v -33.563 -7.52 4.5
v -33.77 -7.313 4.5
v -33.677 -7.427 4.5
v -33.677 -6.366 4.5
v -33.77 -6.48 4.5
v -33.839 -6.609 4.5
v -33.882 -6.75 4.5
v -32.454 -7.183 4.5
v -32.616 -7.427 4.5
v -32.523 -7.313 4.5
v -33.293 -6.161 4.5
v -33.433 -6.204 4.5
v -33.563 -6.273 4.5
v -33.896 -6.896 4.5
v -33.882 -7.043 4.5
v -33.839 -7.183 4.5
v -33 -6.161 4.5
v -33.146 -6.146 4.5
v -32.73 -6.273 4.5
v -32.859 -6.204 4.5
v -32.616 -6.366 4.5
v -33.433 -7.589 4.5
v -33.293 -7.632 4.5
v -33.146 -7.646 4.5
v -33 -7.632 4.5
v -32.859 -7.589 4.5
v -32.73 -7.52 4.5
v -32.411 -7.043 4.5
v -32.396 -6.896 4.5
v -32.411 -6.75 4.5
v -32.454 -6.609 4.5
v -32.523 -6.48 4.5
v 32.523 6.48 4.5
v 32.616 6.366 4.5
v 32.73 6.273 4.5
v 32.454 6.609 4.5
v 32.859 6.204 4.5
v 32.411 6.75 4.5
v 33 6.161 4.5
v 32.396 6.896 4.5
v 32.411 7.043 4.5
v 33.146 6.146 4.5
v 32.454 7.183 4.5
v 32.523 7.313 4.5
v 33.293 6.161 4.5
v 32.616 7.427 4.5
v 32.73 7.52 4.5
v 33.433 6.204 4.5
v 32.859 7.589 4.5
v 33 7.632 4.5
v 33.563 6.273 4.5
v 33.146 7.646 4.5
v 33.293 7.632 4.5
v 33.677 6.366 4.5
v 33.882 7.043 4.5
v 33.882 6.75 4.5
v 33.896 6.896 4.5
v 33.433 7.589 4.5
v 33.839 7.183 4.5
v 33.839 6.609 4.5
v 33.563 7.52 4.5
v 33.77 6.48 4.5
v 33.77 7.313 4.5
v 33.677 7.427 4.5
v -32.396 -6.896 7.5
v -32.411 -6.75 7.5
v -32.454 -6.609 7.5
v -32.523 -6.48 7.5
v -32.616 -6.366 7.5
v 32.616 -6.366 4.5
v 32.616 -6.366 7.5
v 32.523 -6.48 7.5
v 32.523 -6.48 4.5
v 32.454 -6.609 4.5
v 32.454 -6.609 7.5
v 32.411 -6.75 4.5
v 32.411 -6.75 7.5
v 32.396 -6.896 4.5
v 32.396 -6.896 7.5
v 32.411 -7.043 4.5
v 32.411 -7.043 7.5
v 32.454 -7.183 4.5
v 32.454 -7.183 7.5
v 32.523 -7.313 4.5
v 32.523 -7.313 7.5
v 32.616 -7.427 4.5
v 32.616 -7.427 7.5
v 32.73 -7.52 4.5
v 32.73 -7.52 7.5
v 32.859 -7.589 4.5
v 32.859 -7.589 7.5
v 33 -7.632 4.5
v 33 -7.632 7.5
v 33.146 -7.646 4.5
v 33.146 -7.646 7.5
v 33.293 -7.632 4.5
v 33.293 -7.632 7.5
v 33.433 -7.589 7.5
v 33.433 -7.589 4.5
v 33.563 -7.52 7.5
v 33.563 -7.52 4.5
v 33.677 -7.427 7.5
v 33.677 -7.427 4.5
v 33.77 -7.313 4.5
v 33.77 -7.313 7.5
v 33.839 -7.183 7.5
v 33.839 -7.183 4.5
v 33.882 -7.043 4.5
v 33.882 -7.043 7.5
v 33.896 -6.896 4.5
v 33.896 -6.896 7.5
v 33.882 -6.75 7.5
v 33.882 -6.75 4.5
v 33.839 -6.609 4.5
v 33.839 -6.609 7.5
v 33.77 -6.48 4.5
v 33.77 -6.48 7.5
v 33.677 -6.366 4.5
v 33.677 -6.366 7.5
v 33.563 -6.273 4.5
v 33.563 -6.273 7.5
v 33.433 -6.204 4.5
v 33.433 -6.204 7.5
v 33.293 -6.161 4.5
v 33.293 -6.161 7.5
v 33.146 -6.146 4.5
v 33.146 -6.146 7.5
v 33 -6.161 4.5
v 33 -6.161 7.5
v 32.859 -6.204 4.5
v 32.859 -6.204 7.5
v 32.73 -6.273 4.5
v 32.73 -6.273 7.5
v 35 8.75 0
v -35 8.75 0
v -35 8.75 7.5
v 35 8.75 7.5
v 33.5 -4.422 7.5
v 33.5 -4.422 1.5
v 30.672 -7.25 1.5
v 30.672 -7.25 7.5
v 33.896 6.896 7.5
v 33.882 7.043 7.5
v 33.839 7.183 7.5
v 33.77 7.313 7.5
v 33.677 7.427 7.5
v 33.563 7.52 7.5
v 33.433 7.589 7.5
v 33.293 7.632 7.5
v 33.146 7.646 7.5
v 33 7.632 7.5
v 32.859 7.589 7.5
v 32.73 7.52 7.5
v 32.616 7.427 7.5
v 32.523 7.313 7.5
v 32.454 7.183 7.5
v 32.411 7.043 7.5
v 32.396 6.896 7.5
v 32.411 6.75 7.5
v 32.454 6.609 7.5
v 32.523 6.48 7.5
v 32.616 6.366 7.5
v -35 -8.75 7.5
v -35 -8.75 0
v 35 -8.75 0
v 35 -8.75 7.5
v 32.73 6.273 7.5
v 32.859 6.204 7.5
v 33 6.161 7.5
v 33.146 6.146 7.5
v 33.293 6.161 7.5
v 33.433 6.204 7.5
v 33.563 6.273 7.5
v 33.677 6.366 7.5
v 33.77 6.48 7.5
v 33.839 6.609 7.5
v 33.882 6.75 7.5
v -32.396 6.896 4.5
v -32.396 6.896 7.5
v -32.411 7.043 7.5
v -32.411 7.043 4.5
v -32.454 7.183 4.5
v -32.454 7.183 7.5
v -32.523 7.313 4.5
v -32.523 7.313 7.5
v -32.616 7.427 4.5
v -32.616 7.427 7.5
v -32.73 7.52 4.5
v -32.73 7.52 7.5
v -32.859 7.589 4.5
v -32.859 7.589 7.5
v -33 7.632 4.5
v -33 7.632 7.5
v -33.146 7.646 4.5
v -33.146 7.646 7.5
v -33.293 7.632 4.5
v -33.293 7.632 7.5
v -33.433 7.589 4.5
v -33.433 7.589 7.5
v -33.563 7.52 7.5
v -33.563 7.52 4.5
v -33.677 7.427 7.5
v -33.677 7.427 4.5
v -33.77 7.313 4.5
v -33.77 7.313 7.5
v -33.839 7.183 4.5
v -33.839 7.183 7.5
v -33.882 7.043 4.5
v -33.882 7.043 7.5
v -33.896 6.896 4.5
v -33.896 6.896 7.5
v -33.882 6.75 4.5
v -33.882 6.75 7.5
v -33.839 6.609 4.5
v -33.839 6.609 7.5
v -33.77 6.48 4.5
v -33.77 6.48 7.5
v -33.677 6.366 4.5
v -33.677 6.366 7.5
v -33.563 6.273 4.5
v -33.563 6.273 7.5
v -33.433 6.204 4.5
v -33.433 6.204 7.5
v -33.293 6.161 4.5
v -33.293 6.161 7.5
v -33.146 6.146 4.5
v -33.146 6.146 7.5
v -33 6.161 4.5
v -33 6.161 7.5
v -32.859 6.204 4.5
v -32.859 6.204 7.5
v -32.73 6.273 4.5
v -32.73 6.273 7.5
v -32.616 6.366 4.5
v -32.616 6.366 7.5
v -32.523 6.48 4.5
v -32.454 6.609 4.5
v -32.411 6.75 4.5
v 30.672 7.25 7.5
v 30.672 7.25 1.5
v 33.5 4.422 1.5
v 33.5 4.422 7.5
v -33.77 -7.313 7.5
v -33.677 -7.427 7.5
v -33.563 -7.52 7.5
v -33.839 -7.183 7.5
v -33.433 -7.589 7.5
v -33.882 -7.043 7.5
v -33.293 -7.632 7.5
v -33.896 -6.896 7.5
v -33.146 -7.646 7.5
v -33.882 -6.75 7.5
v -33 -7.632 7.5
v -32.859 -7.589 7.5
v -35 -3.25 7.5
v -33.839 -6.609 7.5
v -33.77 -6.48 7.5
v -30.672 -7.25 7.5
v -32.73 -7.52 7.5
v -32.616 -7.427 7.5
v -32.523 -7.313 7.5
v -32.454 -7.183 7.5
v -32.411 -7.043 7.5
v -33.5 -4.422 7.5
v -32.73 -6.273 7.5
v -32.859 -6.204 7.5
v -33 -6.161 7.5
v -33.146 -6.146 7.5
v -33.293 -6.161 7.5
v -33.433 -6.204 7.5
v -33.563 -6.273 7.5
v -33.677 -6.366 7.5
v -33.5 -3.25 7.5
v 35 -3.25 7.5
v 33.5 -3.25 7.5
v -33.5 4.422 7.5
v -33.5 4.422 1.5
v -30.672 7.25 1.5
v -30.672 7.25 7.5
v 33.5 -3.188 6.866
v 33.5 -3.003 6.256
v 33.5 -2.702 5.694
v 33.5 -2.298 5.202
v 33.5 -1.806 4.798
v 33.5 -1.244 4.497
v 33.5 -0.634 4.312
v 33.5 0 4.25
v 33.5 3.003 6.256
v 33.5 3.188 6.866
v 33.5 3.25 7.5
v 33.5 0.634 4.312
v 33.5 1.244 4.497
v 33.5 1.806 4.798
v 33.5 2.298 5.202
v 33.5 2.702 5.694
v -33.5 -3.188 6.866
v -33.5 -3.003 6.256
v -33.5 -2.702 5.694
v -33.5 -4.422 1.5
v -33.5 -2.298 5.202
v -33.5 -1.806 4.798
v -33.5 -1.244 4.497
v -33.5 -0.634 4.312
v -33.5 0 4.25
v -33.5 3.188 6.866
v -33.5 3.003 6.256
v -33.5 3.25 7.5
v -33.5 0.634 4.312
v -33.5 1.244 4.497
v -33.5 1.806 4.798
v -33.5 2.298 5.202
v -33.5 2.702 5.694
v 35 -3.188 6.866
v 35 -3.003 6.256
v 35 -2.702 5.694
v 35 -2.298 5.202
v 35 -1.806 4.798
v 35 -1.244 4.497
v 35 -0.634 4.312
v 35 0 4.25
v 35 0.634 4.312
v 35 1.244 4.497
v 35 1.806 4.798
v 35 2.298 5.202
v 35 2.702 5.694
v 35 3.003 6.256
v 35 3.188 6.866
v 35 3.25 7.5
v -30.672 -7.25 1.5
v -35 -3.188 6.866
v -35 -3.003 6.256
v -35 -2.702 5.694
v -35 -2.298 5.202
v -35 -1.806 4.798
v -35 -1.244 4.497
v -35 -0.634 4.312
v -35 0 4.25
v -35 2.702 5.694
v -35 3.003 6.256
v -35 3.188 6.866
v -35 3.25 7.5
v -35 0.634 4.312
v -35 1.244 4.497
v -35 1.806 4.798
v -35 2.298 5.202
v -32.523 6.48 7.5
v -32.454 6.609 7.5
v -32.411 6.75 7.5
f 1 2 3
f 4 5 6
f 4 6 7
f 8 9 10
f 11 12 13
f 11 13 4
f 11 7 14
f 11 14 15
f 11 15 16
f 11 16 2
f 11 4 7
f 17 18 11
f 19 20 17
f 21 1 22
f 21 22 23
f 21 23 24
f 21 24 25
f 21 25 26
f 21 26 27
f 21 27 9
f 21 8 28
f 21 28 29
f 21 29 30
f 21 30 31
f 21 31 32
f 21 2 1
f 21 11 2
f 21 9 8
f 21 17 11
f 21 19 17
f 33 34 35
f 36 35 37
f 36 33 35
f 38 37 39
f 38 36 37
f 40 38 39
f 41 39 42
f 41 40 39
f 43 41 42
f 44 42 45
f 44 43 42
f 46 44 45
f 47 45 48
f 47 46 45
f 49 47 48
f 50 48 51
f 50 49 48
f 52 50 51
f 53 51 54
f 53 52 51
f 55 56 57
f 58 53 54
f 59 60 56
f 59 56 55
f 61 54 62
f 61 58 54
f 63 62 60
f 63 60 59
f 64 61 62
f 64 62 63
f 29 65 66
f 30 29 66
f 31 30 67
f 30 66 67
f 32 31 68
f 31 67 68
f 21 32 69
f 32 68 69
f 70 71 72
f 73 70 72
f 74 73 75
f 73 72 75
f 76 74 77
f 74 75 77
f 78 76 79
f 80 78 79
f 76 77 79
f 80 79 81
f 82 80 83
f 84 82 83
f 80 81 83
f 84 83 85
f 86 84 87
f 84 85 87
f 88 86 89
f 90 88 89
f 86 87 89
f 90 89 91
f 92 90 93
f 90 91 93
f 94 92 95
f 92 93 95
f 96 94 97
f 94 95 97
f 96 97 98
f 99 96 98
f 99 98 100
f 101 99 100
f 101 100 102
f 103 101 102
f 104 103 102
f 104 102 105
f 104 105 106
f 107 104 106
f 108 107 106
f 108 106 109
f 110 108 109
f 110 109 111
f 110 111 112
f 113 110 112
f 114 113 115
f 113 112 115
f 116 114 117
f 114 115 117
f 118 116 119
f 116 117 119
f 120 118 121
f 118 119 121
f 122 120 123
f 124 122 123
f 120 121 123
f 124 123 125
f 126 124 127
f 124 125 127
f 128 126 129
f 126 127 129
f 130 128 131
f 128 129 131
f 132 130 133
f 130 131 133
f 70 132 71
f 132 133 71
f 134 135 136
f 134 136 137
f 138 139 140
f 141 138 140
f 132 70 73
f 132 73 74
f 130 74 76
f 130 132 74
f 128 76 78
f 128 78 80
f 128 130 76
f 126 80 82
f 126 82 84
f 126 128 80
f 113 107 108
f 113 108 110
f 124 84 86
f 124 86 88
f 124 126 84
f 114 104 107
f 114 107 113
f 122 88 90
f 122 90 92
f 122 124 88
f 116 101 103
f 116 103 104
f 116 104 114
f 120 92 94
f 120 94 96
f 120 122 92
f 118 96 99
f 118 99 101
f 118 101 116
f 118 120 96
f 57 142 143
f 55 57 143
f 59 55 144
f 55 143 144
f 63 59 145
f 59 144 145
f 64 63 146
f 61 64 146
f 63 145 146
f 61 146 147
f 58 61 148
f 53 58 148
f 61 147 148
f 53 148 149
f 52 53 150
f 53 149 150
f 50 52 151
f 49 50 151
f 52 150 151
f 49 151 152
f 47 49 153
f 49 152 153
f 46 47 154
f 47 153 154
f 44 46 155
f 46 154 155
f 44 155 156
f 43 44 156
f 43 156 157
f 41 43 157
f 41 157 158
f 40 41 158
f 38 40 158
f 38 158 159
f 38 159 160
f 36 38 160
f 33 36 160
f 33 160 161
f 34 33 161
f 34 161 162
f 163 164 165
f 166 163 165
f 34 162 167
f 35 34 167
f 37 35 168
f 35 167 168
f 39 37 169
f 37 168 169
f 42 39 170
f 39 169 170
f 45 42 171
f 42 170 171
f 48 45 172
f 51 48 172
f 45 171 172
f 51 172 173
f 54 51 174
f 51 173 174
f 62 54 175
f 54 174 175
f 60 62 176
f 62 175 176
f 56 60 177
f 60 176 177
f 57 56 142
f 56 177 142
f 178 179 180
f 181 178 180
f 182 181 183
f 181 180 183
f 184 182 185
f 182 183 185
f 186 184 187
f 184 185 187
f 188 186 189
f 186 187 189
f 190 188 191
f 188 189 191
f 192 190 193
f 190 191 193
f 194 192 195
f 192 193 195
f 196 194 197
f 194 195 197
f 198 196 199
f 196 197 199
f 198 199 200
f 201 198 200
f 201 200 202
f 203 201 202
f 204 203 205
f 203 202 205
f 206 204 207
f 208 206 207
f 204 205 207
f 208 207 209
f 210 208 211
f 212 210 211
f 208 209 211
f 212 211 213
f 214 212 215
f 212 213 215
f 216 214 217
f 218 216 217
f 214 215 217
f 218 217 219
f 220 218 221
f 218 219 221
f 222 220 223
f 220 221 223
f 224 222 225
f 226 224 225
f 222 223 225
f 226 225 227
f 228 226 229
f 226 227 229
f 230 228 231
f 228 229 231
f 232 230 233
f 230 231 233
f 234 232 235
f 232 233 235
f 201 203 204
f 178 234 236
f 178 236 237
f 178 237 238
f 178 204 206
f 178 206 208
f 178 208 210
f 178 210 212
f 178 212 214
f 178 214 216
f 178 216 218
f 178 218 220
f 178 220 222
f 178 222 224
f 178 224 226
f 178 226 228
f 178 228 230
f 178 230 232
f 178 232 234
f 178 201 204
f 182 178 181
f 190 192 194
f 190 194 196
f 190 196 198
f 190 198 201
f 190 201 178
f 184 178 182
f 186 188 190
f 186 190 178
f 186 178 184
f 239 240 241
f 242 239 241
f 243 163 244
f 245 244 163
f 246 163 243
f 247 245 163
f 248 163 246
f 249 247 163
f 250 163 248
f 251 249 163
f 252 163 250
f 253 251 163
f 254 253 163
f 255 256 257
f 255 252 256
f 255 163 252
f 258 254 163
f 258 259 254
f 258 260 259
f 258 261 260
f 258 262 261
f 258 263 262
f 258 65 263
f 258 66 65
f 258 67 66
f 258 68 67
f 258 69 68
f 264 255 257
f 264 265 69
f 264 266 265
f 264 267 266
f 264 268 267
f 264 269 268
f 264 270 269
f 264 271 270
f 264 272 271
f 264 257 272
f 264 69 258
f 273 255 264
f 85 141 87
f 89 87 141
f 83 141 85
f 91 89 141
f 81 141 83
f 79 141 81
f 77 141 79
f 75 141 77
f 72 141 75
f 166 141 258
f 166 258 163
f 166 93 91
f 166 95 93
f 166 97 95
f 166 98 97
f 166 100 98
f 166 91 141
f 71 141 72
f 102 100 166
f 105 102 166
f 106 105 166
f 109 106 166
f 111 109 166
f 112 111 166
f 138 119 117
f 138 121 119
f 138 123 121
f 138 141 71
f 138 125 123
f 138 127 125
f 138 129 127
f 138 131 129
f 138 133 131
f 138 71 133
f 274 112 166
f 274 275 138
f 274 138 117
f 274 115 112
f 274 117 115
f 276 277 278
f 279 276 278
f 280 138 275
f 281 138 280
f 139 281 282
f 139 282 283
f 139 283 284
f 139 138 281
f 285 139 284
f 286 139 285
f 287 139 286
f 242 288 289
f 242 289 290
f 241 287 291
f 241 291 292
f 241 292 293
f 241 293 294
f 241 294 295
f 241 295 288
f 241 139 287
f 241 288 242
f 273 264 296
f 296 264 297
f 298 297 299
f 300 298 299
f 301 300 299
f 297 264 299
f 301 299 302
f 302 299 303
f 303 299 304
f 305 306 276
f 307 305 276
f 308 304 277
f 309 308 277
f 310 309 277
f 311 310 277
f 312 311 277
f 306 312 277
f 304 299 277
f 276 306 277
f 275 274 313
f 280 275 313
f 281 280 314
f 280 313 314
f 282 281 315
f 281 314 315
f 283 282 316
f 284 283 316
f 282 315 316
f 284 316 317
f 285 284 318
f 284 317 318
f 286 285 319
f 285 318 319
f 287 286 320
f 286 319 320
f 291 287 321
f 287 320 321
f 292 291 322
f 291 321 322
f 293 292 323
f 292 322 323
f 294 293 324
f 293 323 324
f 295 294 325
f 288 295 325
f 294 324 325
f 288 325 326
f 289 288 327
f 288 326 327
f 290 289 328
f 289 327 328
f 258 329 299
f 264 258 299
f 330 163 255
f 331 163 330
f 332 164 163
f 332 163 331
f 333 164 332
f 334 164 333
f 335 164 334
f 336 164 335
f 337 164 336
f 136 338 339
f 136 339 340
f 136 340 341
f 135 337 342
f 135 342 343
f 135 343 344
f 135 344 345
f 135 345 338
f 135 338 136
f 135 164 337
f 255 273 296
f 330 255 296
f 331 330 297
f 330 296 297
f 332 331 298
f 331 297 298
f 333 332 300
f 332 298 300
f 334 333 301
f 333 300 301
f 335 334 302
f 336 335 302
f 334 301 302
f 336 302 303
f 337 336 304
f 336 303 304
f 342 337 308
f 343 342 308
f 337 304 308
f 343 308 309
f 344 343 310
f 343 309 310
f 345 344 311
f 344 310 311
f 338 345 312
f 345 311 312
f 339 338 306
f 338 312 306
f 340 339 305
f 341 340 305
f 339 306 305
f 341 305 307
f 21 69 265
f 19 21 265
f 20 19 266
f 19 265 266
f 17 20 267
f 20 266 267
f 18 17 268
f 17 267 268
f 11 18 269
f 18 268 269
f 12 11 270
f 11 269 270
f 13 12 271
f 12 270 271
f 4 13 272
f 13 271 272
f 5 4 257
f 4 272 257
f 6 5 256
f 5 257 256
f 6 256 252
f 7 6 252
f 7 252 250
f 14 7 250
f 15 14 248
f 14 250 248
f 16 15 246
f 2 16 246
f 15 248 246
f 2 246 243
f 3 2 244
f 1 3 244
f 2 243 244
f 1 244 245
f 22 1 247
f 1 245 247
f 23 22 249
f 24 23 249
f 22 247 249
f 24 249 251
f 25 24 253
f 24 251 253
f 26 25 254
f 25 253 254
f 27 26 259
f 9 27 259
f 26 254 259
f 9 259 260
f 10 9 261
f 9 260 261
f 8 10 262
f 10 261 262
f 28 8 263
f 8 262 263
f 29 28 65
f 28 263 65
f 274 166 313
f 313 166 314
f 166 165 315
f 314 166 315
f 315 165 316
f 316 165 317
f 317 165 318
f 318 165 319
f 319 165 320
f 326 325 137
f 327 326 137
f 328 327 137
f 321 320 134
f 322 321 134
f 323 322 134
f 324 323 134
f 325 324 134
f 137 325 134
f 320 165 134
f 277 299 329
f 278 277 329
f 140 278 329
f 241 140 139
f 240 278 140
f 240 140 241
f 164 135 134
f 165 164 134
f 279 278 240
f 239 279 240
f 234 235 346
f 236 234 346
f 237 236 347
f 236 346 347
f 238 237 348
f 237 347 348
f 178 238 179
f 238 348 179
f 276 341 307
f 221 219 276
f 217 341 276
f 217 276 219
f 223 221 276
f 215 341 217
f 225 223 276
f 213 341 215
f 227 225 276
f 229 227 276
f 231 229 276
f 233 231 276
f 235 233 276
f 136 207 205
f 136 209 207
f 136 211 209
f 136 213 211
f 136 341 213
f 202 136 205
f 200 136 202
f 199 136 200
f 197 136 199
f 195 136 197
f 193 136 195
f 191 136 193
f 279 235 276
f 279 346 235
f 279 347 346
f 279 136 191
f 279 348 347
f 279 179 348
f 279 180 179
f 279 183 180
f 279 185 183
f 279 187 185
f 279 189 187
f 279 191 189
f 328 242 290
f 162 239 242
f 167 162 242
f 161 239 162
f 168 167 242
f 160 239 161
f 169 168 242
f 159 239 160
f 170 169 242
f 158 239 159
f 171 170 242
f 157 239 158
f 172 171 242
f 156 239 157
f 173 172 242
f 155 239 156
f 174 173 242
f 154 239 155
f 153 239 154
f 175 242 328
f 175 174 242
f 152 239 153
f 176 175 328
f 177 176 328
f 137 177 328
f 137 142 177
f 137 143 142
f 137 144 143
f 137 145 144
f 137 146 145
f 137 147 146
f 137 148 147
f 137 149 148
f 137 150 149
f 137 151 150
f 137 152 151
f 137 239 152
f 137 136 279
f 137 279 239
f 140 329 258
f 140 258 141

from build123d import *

# Parameters (mm, degrees)
F0_W     = 70
F0_H     = 17.5
F1_DEPTH = 7.5
F2_T     = -1.5
F4_DEPTH = 6
F6_DEPTH = 3
F7_R     = 3.25
F8_DEPTH = 70.001


with BuildPart() as f1:
    # F0 (on Top) → F1 (new body)
    with BuildSketch(Plane.XY):
        Rectangle(F0_W, F0_H)
    extrude(amount=F1_DEPTH)

    # F2
    f2_openings = [f1.faces().sort_by_distance(p)[0] for p in [
        (0, 0, 7.5),
    ]]
    offset(amount=F2_T, openings=f2_openings)

    # F3 (on face) → F4 (join, through all)
    with BuildSketch(Plane.XY.offset(1.5)):
        Polygon((-33.5, 7.25), (-33.5, 4.421573), (-30.671573, 7.25), align=None)
        Polygon((30.671573, 7.25), (33.5, 4.421573), (33.5, 7.25), align=None)
        Polygon((33.5, -7.25), (33.5, -4.421573), (30.671573, -7.25), align=None)
        Polygon((-33.5, -4.421573), (-33.5, -7.25), (-30.671573, -7.25), align=None)
    extrude(amount=F4_DEPTH)

    # F5 (on face) → F6 (cut)
    with BuildSketch(Plane.XY.offset(7.5)):
        with BuildLine():
            ThreePointArc((-32.616117, 6.366117), (-32.453537, 6.609434), (-32.396447, 6.896447))
            ThreePointArc((-32.396447, 6.896447), (-33.839356, 7.183459), (-32.616117, 6.366117))
        make_face()
        with BuildLine():
            ThreePointArc((-32.616117, -6.366117), (-33.839356, -7.183459), (-32.396447, -6.896447))
            ThreePointArc((-32.396447, -6.896447), (-32.453537, -6.609434), (-32.616117, -6.366117))
        make_face()
        with BuildLine():
            ThreePointArc((32.616117, 6.366117), (33.433459, 6.203537), (33.896447, 6.896447))
            ThreePointArc((33.896447, 6.896447), (32.859434, 7.589356), (32.616117, 6.366117))
        make_face()
        with BuildLine():
            ThreePointArc((32.616117, -6.366117), (32.859434, -7.589356), (33.896447, -6.896447))
            ThreePointArc((33.896447, -6.896447), (33.433459, -6.203537), (32.616117, -6.366117))
        make_face()
    extrude(amount=-F6_DEPTH, mode=Mode.SUBTRACT)

    # F7 (on face) → F8 (cut, through all)
    with BuildSketch(Plane.YZ.offset(35)):
        with Locations((0, 7.5)):
            Circle(F7_R)
    extrude(amount=-F8_DEPTH, mode=Mode.SUBTRACT)


solid = f1.part
